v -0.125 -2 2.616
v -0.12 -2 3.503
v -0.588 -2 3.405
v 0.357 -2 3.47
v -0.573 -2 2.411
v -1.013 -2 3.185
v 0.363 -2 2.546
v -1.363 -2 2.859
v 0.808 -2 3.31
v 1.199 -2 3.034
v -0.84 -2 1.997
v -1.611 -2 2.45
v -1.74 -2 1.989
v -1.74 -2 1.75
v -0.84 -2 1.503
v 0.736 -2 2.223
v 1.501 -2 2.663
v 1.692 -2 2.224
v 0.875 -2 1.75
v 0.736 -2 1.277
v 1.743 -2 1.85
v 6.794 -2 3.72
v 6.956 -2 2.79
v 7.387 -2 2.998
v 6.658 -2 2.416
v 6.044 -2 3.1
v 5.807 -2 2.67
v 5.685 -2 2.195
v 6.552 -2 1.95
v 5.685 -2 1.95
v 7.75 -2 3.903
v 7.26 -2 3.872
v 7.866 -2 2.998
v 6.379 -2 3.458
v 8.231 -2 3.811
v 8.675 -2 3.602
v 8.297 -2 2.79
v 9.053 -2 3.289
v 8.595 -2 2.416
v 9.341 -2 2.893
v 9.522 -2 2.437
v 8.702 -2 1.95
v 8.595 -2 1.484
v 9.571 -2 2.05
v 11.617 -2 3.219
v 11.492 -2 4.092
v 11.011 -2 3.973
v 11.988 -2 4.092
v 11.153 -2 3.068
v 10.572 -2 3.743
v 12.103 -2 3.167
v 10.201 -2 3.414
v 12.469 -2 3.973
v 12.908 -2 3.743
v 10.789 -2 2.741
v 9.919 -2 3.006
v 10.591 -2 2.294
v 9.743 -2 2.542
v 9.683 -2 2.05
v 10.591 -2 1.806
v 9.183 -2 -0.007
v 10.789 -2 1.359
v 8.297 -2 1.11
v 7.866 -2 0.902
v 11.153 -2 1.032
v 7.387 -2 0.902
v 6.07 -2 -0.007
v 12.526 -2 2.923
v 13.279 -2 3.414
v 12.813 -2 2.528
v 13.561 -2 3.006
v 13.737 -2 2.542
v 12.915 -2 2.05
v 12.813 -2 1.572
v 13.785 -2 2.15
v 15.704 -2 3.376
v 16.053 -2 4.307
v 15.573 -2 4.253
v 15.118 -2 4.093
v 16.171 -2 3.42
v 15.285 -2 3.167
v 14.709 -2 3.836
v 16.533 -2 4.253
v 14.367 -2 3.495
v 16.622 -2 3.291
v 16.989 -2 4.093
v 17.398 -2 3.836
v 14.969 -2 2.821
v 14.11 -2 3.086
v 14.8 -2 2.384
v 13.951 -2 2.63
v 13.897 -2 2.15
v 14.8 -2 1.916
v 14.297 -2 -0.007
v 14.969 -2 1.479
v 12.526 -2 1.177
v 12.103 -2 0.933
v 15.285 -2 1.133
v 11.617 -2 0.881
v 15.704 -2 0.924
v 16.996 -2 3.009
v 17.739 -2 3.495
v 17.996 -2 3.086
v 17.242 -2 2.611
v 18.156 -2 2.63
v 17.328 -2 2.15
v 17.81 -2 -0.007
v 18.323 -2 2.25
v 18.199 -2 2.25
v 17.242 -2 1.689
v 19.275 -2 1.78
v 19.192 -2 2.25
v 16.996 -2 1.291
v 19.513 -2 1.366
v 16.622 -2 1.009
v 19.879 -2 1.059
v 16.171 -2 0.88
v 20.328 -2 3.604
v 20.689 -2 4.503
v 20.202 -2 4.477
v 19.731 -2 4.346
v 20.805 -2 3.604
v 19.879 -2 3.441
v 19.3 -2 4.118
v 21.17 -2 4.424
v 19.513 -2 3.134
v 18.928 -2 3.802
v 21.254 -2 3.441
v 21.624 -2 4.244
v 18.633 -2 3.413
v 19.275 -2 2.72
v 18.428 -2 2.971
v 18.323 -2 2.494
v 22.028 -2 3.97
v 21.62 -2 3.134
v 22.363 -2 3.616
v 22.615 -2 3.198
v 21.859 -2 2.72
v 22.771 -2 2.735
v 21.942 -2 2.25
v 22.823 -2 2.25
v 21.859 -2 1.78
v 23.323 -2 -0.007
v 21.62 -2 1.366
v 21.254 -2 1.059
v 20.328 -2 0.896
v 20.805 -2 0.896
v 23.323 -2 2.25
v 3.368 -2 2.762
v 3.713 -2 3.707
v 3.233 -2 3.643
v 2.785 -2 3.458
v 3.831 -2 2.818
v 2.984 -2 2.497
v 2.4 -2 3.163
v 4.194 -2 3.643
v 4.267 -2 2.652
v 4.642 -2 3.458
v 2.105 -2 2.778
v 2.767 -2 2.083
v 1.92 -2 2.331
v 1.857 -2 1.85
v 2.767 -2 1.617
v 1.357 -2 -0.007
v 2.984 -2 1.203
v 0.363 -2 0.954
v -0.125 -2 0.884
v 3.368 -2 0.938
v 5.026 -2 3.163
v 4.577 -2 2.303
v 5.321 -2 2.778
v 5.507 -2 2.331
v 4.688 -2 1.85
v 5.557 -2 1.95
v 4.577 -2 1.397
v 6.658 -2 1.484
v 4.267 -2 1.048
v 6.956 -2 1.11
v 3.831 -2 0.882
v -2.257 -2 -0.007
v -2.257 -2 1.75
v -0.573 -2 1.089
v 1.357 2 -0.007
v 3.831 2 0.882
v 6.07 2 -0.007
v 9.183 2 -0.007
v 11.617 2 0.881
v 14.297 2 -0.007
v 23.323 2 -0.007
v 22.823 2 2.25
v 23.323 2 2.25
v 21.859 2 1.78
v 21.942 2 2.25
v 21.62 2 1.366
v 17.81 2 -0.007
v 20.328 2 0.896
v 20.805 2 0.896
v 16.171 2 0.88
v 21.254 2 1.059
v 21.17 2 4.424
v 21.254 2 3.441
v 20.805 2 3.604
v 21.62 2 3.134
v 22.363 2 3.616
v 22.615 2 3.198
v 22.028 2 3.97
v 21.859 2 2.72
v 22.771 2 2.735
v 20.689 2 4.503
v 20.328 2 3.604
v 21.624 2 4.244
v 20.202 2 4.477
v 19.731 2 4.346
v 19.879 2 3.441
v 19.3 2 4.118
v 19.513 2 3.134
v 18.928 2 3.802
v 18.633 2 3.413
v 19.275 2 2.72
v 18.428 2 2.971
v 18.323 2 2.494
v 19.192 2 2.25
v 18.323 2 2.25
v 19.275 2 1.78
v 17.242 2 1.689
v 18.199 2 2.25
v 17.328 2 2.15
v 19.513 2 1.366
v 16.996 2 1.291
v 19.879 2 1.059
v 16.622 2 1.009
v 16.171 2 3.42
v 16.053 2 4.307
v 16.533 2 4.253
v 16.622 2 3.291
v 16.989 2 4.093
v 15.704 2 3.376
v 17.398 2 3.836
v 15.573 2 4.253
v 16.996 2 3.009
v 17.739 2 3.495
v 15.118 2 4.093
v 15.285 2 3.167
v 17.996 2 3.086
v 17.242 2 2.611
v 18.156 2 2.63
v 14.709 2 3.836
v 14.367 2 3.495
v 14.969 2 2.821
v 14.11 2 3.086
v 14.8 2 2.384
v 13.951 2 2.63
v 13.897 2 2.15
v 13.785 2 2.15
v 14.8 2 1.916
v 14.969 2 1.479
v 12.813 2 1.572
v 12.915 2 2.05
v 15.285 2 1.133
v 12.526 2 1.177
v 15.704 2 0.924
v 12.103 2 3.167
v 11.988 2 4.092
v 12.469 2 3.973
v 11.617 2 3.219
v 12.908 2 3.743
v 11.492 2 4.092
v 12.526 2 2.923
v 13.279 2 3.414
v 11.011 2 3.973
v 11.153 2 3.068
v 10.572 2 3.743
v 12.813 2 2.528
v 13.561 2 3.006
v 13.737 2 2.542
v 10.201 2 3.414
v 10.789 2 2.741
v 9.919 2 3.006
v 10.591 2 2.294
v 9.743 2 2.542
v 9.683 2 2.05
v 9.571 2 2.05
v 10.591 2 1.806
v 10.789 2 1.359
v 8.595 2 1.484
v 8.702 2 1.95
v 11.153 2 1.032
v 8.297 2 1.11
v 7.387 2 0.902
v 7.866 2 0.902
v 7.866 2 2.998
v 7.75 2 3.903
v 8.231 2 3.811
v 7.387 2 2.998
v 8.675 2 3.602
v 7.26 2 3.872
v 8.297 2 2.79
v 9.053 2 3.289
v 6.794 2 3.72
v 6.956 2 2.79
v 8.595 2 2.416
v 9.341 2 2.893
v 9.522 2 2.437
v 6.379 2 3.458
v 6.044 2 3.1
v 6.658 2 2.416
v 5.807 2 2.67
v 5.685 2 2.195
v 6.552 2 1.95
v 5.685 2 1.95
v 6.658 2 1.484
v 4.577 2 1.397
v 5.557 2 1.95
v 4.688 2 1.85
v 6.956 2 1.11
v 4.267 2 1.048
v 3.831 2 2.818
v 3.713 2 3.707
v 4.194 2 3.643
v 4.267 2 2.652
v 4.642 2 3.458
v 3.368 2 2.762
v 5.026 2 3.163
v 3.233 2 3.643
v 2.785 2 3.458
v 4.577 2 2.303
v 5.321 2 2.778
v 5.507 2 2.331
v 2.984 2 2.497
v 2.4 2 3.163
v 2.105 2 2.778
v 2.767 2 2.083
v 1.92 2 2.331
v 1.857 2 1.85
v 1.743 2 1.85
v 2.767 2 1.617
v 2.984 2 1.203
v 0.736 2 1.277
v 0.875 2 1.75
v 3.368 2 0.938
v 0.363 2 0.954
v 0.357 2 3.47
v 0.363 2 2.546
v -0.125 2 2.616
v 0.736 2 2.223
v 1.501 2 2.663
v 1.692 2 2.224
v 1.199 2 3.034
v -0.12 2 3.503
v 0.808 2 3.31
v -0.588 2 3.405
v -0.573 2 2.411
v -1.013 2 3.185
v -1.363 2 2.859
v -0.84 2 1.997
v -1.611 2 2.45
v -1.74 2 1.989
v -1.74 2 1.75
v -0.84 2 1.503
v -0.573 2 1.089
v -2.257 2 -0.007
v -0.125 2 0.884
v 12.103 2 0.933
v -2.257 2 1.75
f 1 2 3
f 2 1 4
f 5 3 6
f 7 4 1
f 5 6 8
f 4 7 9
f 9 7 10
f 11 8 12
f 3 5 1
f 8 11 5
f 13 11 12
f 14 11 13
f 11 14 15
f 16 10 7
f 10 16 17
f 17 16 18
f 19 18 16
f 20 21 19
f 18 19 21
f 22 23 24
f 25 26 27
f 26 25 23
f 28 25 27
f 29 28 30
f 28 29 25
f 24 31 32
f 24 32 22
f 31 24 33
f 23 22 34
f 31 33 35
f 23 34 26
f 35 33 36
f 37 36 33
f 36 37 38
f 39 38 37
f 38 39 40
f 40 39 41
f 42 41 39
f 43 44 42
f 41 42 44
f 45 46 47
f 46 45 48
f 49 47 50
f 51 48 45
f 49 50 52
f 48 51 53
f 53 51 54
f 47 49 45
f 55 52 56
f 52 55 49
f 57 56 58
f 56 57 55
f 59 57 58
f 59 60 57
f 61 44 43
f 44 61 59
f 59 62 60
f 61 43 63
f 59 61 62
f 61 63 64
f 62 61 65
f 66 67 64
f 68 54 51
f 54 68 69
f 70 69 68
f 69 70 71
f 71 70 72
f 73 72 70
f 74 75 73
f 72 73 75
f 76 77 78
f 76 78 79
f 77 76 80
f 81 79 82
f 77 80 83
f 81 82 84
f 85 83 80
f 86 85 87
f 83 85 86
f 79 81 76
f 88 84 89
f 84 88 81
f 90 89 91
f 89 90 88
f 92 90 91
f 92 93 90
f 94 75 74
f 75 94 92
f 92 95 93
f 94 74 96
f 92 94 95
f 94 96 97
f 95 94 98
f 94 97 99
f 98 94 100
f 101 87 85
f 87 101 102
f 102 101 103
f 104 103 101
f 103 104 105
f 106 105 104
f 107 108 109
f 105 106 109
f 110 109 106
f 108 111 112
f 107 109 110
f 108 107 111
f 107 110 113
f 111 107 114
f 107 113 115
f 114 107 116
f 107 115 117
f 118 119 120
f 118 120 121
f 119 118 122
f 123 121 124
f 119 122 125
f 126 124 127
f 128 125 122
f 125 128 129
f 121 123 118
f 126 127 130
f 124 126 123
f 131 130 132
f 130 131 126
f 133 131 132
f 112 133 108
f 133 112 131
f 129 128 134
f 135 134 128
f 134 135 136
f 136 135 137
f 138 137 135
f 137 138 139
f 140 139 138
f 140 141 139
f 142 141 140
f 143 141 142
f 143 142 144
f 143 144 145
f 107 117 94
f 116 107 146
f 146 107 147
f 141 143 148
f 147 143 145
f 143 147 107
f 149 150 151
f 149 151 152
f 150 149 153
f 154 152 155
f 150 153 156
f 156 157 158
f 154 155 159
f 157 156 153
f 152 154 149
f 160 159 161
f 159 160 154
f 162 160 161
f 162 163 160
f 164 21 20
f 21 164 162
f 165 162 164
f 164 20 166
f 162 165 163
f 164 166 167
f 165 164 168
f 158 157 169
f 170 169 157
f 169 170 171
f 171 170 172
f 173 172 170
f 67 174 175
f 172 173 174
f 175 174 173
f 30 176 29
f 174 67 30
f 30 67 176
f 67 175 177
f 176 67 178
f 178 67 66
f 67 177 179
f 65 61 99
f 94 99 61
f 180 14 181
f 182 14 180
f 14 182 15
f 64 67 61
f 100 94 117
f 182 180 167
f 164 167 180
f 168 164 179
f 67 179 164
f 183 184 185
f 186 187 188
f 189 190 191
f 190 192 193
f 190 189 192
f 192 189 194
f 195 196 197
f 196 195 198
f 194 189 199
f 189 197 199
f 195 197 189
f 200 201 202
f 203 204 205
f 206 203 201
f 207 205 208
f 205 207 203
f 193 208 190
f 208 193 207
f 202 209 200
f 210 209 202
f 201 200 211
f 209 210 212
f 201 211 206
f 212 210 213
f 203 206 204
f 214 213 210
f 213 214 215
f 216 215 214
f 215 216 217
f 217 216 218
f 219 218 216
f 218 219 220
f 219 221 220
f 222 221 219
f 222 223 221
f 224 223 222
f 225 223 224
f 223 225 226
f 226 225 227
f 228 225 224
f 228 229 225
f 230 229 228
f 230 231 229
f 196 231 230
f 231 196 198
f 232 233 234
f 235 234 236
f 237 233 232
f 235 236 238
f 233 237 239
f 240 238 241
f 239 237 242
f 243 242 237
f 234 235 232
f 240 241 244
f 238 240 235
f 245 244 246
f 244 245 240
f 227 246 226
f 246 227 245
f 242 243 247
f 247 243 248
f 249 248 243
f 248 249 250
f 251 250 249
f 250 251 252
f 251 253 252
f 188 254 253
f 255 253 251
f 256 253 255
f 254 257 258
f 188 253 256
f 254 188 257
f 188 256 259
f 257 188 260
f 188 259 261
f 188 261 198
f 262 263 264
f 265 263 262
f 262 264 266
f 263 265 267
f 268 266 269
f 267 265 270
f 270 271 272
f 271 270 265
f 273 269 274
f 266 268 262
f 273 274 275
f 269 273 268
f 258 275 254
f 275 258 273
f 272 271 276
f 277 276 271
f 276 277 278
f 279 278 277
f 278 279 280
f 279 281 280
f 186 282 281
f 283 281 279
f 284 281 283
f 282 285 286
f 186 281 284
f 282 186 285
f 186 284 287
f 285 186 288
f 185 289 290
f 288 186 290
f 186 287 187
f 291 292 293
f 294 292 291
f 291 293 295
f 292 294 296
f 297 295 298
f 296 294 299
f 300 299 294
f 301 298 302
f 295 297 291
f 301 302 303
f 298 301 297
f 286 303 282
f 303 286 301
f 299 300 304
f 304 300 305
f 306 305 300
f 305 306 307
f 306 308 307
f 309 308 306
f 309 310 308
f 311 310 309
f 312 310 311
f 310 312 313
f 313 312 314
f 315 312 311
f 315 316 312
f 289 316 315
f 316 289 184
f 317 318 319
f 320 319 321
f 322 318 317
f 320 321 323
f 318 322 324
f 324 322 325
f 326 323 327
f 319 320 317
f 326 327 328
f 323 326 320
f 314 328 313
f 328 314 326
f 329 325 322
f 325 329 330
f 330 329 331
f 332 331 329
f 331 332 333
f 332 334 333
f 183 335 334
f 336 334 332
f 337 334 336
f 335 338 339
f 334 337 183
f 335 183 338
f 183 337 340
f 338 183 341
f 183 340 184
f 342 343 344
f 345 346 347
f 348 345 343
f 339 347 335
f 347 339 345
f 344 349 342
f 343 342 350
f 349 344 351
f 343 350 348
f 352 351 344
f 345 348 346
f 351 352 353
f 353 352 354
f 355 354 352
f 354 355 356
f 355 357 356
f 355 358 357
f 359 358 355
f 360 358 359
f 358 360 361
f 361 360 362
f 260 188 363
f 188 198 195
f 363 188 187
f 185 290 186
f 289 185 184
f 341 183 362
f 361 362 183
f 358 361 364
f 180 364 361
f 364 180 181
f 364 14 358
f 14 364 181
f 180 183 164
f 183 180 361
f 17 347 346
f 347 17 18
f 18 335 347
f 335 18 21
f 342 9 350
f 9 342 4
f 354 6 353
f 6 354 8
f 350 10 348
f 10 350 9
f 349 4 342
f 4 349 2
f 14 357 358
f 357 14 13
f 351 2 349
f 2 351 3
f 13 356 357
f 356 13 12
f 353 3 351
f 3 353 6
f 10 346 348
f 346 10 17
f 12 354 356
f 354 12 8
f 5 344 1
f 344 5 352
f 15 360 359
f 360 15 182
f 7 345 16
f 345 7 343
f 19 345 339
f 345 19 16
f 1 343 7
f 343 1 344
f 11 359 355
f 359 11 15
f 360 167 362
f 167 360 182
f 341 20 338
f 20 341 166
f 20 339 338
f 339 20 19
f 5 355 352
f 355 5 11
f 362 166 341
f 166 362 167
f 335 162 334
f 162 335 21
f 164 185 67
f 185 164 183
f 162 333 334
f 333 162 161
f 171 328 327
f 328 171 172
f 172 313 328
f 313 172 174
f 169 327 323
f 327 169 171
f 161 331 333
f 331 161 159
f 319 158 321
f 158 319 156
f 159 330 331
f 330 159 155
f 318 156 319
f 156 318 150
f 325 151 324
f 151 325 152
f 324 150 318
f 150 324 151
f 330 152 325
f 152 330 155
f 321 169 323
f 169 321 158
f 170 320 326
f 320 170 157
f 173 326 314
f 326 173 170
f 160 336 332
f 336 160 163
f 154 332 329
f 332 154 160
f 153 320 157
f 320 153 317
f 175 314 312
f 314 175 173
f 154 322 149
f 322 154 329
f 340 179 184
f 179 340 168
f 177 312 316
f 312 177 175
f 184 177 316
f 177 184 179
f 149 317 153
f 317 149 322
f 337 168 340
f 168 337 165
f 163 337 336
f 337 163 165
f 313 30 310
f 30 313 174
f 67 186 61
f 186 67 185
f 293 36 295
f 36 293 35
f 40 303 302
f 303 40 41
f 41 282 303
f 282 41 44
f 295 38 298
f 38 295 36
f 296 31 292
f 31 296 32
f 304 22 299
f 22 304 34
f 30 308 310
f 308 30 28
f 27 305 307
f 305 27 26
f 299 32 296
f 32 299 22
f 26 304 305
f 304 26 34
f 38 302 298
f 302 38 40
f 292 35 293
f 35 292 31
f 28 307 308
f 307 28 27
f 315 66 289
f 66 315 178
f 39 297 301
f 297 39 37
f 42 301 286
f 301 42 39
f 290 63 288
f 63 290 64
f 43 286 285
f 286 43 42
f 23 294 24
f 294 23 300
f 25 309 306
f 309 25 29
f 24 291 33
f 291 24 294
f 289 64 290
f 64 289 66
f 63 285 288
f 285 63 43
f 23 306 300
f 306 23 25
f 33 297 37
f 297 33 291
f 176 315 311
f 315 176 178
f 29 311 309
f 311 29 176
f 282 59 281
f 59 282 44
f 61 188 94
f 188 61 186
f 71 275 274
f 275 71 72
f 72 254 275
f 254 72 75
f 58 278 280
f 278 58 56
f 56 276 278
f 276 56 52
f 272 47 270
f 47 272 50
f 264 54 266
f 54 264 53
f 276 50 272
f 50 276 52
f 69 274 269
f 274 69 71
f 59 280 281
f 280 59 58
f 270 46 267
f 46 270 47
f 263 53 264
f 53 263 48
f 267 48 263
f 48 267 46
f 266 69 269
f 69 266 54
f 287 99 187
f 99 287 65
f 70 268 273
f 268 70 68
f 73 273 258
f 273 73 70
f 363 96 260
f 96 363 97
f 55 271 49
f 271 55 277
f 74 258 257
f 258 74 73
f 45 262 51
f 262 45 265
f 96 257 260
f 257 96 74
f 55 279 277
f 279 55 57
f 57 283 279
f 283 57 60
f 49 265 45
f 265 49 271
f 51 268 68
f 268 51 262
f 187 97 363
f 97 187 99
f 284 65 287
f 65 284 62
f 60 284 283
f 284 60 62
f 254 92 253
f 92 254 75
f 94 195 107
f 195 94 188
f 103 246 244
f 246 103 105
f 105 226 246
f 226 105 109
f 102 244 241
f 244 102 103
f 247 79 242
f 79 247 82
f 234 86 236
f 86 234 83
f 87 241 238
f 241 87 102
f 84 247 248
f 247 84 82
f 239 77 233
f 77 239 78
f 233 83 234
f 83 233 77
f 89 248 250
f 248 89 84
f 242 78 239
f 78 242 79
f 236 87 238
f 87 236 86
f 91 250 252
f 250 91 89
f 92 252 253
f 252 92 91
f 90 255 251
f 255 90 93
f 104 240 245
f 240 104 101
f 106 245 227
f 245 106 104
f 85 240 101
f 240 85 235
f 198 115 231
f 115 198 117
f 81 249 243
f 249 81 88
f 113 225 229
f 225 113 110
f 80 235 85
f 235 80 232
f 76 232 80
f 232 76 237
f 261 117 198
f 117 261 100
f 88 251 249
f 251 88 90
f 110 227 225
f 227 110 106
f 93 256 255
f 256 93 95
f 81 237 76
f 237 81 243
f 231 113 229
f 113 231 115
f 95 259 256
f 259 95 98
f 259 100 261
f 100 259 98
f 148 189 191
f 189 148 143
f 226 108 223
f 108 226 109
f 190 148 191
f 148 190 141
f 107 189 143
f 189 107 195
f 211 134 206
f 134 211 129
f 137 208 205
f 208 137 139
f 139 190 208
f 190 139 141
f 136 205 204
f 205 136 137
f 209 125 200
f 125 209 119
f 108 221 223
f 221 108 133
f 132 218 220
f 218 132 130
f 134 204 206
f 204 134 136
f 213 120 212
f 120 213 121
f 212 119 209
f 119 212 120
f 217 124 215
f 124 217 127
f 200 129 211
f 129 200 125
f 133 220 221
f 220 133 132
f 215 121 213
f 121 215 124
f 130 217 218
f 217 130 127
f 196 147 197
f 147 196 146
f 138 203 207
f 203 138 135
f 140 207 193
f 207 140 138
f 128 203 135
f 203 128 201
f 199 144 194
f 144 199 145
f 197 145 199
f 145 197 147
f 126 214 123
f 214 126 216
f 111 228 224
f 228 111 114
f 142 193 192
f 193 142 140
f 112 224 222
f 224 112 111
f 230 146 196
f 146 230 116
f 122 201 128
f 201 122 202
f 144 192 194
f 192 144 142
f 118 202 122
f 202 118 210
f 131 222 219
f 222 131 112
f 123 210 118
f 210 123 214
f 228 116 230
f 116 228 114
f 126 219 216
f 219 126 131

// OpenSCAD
$fa=.01;
$fs=.5;

branches = 9;
bed_diameter = 200;
diameter = 75;
width=4;
thickness=1.75;

module main(){

cylinder(d=diameter, h=thickness, $fn=branches);
for(i=[0:branches-1])
  rotate([0,0,i*360/branches])
  translate([0,-width/2,0])
  cube([bed_diameter/2, width,thickness]);
starter_diameter =2*thickness+1/75;
translate([diameter/2,0,thickness+1.75/2])
  rotate([90,0,0])
  difference(){
    cylinder(h=width,d=starter_diameter, center=true);
    cylinder(h=width+.1,d=1.75, center=true);
  }
}

n=5;
starter_diameter =2*thickness+1/75;
for(i=[0:n]){
  translate([i*starter_diameter+i*(i+1)*.1,0,1.75+i*.1])rotate([90,0,0])
  difference(){
    union(){
      translate([0,-starter_diameter/4-i*.05,0])
        cube([starter_diameter+i*.2+1,starter_diameter/2+i*.1,width], center=true);
    cylinder(h=width,d=starter_diameter+i*.2, center=true);
    }
    cylinder(h=width+.1,d=1.75+i*.2, center=true);
  }
}
